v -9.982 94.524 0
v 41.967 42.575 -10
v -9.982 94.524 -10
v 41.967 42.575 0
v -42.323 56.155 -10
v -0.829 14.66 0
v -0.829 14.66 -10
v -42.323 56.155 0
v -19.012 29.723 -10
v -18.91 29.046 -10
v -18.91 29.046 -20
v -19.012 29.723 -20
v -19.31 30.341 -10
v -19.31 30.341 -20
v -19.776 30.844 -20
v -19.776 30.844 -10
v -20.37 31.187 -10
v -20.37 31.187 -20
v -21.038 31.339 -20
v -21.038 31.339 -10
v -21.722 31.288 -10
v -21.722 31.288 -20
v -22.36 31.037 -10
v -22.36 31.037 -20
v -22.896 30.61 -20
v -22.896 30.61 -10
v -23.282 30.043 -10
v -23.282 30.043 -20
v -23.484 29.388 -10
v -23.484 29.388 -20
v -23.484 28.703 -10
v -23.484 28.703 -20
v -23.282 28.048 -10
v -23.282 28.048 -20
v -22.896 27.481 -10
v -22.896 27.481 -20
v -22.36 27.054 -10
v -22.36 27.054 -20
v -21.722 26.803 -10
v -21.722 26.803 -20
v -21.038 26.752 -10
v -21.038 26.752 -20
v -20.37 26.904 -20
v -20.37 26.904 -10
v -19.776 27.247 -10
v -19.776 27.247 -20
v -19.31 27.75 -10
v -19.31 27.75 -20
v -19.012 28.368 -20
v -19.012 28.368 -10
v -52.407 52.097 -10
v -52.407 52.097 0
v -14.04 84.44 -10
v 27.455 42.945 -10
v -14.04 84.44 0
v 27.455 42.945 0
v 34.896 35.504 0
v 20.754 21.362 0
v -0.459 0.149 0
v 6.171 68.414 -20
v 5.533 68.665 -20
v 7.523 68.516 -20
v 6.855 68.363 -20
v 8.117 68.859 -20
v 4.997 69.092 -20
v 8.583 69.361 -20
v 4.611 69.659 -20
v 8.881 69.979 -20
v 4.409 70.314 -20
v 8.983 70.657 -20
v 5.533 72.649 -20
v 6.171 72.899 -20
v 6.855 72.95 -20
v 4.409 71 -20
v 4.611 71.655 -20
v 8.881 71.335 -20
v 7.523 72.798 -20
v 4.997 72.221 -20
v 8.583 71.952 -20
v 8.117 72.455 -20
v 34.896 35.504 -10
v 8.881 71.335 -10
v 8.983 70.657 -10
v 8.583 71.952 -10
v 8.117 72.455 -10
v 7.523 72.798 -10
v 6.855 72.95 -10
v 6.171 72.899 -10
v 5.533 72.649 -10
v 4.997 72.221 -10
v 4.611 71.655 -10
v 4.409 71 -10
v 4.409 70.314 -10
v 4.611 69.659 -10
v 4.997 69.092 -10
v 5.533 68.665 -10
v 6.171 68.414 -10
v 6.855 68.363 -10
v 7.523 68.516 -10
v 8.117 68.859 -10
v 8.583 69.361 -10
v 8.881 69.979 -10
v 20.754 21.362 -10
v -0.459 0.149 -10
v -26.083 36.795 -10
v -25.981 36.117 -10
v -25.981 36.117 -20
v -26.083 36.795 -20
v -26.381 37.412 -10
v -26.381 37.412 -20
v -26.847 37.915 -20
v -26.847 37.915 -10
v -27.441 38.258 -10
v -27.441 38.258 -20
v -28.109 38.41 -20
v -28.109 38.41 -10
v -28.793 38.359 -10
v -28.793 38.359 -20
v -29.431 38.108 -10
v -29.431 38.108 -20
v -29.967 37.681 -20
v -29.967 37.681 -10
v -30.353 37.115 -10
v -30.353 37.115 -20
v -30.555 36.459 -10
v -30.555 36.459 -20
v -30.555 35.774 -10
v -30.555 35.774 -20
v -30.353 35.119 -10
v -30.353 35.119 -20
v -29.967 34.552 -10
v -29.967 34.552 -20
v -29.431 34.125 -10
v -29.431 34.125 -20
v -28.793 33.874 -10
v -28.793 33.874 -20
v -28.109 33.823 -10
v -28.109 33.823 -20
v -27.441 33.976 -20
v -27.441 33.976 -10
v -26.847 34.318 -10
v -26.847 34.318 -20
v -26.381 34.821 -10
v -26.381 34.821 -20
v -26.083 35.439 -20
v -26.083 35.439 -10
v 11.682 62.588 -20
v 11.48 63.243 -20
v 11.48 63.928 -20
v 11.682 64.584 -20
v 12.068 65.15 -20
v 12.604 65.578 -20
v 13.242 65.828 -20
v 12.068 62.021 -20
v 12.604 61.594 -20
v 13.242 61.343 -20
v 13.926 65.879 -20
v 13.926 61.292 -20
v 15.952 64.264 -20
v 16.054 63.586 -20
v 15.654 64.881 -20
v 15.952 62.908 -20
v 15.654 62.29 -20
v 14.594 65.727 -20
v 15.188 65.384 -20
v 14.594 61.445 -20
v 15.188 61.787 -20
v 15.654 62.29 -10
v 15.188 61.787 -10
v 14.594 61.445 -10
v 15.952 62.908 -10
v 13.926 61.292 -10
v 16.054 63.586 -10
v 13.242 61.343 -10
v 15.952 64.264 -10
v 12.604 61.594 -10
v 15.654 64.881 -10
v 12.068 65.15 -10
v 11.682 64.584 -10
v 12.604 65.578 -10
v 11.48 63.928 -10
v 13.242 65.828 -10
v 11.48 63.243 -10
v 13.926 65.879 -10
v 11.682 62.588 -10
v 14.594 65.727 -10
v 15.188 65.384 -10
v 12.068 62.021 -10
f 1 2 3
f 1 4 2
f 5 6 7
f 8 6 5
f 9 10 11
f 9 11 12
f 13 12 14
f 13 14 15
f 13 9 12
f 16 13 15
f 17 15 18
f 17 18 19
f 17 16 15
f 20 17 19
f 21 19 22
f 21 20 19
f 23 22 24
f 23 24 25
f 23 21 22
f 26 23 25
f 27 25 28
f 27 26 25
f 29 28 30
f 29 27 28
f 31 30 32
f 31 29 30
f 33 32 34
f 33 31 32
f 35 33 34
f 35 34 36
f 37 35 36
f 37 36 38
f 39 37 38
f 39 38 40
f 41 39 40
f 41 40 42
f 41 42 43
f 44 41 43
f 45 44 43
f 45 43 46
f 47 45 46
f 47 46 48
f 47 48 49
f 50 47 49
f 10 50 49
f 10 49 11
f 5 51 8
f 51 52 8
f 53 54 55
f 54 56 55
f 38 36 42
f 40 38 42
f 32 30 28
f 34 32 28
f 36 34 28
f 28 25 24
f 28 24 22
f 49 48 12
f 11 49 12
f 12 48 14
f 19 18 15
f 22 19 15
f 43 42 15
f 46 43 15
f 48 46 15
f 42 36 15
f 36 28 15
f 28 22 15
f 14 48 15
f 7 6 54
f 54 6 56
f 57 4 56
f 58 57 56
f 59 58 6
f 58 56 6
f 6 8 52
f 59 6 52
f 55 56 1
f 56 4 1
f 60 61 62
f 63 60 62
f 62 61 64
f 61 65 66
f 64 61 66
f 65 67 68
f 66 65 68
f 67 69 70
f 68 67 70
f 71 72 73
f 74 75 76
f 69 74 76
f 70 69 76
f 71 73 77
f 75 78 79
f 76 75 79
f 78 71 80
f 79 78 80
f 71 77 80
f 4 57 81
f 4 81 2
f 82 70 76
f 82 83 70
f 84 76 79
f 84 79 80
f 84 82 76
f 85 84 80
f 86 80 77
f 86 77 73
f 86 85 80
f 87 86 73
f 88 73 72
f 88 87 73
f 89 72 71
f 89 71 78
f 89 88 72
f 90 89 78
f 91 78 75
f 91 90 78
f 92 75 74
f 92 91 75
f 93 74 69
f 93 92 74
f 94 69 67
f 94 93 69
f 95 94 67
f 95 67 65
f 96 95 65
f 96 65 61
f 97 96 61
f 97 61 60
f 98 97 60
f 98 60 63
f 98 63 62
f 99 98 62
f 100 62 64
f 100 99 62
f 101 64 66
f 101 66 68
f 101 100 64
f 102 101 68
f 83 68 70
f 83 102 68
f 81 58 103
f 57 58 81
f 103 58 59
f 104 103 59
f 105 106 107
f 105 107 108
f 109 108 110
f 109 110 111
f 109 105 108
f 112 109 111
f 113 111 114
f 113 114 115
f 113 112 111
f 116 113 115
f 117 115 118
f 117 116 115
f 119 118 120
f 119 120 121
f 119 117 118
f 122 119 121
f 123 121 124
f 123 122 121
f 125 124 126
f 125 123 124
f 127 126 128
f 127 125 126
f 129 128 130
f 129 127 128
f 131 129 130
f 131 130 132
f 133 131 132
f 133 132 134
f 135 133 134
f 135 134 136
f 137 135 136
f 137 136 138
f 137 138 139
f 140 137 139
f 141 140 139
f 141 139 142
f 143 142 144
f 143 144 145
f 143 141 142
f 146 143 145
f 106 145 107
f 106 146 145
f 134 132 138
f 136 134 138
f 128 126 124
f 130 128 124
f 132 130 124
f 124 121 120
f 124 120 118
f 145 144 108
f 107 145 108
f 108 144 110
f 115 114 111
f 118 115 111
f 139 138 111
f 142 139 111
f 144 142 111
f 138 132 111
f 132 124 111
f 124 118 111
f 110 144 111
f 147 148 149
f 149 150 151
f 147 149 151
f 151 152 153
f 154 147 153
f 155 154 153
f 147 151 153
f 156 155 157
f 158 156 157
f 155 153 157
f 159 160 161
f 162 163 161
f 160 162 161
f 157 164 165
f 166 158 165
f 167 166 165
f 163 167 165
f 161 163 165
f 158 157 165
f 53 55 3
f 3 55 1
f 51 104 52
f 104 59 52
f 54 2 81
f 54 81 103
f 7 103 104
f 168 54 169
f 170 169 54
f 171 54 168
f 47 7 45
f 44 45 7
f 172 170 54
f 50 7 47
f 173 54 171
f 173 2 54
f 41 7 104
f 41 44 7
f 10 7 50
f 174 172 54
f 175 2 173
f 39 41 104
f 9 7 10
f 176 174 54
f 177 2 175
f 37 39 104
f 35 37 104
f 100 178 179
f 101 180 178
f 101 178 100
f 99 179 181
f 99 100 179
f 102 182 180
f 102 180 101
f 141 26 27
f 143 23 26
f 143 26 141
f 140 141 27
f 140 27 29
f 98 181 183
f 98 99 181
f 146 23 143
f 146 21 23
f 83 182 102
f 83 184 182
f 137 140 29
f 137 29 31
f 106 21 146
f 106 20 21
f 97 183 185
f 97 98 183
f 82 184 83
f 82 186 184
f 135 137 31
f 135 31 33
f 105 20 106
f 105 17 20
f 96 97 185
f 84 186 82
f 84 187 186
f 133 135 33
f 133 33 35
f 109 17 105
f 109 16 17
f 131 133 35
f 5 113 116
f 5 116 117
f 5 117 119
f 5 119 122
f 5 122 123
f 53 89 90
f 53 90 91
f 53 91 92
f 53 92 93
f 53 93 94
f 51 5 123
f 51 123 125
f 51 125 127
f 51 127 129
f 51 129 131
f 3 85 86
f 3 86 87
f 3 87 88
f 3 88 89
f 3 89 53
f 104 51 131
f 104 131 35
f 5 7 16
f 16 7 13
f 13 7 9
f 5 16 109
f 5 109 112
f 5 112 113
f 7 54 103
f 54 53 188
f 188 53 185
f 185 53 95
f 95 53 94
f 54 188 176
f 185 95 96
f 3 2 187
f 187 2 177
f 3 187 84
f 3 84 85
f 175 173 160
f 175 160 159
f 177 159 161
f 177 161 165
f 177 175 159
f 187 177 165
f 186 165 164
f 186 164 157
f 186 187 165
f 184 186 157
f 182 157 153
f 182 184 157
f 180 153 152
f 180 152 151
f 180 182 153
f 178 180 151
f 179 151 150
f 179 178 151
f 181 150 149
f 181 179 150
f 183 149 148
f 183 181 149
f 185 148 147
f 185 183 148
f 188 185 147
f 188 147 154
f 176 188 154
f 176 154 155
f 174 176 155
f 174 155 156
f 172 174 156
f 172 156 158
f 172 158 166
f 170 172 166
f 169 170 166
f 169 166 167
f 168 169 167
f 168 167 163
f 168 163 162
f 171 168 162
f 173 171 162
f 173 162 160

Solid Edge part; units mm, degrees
sketch "Sketch1" plane through (0, 0, 0) normal (0, 0, 1) x (1, 0, 0)
  line L0 (20.754, 21.3618) -> (6.6119, 7.2197)
  line L1 (6.6119, 7.2197) -> (-0.4592, 0.1486)
  line L2 (-0.4592, 0.1486) -> (-52.4074, 52.0969)
  line L3 (-52.4074, 52.0969) -> (-42.3232, 56.1548)
  line L4 (-0.8289, 14.6605) -> (-42.3232, 56.1548)
  line L5 (-0.8289, 14.6605) -> (27.4554, 42.9448)
  line L6 (27.4554, 42.9448) -> (-14.0397, 84.4398)
  line L7 (-14.0397, 84.4398) -> (-9.9823, 94.5245)
  line L8 (41.9672, 42.575) -> (-9.9823, 94.5245)
  line L9 (34.8962, 35.5039) -> (41.9672, 42.575)
  line L10 (20.754, 21.3618) -> (34.8962, 35.5039)
  circle A0 centre (6.6829, 70.6568) radius 2.3
  circle A1 centre (-21.21, 29.0455) radius 2.3
  circle A2 centre (-28.2811, 36.1166) radius 2.3
  circle A3 centre (13.754, 63.5857) radius 2.3
  dimension "D1" = 20
  dimension "D2" = 73.4659
  dimension "D3" = 40
  dimension "D4" = 10
extrude "Protrusion1" add sketch "Sketch1" against normal blind 10
sketch "Sketch2" plane through (0, 0, 0) normal (0, 0, 1) x (1, 0, 0)
  circle A0 centre (6.6829, 70.6568) radius 2.3
extrude "ExtrudedProtrusion_6" add sketch "Sketch2" against normal blind 20
sketch "Sketch3" plane through (0, 0, 0) normal (0, 0, 1) x (1, 0, 0)
  circle A0 centre (13.754, 63.5857) radius 2.3
extrude "ExtrudedProtrusion_7" add sketch "Sketch3" against normal blind 20
sketch "Sketch4" plane through (0, 0, 0) normal (0, 0, 1) x (1, 0, 0)
  circle A0 centre (-28.2811, 36.1166) radius 2.3
extrude "ExtrudedProtrusion_8" add sketch "Sketch4" against normal blind 20
sketch "Sketch5" plane through (0, 0, 0) normal (0, 0, 1) x (1, 0, 0)
  circle A0 centre (-21.21, 29.0455) radius 2.3
extrude "ExtrudedProtrusion_9" add sketch "Sketch5" against normal blind 20
